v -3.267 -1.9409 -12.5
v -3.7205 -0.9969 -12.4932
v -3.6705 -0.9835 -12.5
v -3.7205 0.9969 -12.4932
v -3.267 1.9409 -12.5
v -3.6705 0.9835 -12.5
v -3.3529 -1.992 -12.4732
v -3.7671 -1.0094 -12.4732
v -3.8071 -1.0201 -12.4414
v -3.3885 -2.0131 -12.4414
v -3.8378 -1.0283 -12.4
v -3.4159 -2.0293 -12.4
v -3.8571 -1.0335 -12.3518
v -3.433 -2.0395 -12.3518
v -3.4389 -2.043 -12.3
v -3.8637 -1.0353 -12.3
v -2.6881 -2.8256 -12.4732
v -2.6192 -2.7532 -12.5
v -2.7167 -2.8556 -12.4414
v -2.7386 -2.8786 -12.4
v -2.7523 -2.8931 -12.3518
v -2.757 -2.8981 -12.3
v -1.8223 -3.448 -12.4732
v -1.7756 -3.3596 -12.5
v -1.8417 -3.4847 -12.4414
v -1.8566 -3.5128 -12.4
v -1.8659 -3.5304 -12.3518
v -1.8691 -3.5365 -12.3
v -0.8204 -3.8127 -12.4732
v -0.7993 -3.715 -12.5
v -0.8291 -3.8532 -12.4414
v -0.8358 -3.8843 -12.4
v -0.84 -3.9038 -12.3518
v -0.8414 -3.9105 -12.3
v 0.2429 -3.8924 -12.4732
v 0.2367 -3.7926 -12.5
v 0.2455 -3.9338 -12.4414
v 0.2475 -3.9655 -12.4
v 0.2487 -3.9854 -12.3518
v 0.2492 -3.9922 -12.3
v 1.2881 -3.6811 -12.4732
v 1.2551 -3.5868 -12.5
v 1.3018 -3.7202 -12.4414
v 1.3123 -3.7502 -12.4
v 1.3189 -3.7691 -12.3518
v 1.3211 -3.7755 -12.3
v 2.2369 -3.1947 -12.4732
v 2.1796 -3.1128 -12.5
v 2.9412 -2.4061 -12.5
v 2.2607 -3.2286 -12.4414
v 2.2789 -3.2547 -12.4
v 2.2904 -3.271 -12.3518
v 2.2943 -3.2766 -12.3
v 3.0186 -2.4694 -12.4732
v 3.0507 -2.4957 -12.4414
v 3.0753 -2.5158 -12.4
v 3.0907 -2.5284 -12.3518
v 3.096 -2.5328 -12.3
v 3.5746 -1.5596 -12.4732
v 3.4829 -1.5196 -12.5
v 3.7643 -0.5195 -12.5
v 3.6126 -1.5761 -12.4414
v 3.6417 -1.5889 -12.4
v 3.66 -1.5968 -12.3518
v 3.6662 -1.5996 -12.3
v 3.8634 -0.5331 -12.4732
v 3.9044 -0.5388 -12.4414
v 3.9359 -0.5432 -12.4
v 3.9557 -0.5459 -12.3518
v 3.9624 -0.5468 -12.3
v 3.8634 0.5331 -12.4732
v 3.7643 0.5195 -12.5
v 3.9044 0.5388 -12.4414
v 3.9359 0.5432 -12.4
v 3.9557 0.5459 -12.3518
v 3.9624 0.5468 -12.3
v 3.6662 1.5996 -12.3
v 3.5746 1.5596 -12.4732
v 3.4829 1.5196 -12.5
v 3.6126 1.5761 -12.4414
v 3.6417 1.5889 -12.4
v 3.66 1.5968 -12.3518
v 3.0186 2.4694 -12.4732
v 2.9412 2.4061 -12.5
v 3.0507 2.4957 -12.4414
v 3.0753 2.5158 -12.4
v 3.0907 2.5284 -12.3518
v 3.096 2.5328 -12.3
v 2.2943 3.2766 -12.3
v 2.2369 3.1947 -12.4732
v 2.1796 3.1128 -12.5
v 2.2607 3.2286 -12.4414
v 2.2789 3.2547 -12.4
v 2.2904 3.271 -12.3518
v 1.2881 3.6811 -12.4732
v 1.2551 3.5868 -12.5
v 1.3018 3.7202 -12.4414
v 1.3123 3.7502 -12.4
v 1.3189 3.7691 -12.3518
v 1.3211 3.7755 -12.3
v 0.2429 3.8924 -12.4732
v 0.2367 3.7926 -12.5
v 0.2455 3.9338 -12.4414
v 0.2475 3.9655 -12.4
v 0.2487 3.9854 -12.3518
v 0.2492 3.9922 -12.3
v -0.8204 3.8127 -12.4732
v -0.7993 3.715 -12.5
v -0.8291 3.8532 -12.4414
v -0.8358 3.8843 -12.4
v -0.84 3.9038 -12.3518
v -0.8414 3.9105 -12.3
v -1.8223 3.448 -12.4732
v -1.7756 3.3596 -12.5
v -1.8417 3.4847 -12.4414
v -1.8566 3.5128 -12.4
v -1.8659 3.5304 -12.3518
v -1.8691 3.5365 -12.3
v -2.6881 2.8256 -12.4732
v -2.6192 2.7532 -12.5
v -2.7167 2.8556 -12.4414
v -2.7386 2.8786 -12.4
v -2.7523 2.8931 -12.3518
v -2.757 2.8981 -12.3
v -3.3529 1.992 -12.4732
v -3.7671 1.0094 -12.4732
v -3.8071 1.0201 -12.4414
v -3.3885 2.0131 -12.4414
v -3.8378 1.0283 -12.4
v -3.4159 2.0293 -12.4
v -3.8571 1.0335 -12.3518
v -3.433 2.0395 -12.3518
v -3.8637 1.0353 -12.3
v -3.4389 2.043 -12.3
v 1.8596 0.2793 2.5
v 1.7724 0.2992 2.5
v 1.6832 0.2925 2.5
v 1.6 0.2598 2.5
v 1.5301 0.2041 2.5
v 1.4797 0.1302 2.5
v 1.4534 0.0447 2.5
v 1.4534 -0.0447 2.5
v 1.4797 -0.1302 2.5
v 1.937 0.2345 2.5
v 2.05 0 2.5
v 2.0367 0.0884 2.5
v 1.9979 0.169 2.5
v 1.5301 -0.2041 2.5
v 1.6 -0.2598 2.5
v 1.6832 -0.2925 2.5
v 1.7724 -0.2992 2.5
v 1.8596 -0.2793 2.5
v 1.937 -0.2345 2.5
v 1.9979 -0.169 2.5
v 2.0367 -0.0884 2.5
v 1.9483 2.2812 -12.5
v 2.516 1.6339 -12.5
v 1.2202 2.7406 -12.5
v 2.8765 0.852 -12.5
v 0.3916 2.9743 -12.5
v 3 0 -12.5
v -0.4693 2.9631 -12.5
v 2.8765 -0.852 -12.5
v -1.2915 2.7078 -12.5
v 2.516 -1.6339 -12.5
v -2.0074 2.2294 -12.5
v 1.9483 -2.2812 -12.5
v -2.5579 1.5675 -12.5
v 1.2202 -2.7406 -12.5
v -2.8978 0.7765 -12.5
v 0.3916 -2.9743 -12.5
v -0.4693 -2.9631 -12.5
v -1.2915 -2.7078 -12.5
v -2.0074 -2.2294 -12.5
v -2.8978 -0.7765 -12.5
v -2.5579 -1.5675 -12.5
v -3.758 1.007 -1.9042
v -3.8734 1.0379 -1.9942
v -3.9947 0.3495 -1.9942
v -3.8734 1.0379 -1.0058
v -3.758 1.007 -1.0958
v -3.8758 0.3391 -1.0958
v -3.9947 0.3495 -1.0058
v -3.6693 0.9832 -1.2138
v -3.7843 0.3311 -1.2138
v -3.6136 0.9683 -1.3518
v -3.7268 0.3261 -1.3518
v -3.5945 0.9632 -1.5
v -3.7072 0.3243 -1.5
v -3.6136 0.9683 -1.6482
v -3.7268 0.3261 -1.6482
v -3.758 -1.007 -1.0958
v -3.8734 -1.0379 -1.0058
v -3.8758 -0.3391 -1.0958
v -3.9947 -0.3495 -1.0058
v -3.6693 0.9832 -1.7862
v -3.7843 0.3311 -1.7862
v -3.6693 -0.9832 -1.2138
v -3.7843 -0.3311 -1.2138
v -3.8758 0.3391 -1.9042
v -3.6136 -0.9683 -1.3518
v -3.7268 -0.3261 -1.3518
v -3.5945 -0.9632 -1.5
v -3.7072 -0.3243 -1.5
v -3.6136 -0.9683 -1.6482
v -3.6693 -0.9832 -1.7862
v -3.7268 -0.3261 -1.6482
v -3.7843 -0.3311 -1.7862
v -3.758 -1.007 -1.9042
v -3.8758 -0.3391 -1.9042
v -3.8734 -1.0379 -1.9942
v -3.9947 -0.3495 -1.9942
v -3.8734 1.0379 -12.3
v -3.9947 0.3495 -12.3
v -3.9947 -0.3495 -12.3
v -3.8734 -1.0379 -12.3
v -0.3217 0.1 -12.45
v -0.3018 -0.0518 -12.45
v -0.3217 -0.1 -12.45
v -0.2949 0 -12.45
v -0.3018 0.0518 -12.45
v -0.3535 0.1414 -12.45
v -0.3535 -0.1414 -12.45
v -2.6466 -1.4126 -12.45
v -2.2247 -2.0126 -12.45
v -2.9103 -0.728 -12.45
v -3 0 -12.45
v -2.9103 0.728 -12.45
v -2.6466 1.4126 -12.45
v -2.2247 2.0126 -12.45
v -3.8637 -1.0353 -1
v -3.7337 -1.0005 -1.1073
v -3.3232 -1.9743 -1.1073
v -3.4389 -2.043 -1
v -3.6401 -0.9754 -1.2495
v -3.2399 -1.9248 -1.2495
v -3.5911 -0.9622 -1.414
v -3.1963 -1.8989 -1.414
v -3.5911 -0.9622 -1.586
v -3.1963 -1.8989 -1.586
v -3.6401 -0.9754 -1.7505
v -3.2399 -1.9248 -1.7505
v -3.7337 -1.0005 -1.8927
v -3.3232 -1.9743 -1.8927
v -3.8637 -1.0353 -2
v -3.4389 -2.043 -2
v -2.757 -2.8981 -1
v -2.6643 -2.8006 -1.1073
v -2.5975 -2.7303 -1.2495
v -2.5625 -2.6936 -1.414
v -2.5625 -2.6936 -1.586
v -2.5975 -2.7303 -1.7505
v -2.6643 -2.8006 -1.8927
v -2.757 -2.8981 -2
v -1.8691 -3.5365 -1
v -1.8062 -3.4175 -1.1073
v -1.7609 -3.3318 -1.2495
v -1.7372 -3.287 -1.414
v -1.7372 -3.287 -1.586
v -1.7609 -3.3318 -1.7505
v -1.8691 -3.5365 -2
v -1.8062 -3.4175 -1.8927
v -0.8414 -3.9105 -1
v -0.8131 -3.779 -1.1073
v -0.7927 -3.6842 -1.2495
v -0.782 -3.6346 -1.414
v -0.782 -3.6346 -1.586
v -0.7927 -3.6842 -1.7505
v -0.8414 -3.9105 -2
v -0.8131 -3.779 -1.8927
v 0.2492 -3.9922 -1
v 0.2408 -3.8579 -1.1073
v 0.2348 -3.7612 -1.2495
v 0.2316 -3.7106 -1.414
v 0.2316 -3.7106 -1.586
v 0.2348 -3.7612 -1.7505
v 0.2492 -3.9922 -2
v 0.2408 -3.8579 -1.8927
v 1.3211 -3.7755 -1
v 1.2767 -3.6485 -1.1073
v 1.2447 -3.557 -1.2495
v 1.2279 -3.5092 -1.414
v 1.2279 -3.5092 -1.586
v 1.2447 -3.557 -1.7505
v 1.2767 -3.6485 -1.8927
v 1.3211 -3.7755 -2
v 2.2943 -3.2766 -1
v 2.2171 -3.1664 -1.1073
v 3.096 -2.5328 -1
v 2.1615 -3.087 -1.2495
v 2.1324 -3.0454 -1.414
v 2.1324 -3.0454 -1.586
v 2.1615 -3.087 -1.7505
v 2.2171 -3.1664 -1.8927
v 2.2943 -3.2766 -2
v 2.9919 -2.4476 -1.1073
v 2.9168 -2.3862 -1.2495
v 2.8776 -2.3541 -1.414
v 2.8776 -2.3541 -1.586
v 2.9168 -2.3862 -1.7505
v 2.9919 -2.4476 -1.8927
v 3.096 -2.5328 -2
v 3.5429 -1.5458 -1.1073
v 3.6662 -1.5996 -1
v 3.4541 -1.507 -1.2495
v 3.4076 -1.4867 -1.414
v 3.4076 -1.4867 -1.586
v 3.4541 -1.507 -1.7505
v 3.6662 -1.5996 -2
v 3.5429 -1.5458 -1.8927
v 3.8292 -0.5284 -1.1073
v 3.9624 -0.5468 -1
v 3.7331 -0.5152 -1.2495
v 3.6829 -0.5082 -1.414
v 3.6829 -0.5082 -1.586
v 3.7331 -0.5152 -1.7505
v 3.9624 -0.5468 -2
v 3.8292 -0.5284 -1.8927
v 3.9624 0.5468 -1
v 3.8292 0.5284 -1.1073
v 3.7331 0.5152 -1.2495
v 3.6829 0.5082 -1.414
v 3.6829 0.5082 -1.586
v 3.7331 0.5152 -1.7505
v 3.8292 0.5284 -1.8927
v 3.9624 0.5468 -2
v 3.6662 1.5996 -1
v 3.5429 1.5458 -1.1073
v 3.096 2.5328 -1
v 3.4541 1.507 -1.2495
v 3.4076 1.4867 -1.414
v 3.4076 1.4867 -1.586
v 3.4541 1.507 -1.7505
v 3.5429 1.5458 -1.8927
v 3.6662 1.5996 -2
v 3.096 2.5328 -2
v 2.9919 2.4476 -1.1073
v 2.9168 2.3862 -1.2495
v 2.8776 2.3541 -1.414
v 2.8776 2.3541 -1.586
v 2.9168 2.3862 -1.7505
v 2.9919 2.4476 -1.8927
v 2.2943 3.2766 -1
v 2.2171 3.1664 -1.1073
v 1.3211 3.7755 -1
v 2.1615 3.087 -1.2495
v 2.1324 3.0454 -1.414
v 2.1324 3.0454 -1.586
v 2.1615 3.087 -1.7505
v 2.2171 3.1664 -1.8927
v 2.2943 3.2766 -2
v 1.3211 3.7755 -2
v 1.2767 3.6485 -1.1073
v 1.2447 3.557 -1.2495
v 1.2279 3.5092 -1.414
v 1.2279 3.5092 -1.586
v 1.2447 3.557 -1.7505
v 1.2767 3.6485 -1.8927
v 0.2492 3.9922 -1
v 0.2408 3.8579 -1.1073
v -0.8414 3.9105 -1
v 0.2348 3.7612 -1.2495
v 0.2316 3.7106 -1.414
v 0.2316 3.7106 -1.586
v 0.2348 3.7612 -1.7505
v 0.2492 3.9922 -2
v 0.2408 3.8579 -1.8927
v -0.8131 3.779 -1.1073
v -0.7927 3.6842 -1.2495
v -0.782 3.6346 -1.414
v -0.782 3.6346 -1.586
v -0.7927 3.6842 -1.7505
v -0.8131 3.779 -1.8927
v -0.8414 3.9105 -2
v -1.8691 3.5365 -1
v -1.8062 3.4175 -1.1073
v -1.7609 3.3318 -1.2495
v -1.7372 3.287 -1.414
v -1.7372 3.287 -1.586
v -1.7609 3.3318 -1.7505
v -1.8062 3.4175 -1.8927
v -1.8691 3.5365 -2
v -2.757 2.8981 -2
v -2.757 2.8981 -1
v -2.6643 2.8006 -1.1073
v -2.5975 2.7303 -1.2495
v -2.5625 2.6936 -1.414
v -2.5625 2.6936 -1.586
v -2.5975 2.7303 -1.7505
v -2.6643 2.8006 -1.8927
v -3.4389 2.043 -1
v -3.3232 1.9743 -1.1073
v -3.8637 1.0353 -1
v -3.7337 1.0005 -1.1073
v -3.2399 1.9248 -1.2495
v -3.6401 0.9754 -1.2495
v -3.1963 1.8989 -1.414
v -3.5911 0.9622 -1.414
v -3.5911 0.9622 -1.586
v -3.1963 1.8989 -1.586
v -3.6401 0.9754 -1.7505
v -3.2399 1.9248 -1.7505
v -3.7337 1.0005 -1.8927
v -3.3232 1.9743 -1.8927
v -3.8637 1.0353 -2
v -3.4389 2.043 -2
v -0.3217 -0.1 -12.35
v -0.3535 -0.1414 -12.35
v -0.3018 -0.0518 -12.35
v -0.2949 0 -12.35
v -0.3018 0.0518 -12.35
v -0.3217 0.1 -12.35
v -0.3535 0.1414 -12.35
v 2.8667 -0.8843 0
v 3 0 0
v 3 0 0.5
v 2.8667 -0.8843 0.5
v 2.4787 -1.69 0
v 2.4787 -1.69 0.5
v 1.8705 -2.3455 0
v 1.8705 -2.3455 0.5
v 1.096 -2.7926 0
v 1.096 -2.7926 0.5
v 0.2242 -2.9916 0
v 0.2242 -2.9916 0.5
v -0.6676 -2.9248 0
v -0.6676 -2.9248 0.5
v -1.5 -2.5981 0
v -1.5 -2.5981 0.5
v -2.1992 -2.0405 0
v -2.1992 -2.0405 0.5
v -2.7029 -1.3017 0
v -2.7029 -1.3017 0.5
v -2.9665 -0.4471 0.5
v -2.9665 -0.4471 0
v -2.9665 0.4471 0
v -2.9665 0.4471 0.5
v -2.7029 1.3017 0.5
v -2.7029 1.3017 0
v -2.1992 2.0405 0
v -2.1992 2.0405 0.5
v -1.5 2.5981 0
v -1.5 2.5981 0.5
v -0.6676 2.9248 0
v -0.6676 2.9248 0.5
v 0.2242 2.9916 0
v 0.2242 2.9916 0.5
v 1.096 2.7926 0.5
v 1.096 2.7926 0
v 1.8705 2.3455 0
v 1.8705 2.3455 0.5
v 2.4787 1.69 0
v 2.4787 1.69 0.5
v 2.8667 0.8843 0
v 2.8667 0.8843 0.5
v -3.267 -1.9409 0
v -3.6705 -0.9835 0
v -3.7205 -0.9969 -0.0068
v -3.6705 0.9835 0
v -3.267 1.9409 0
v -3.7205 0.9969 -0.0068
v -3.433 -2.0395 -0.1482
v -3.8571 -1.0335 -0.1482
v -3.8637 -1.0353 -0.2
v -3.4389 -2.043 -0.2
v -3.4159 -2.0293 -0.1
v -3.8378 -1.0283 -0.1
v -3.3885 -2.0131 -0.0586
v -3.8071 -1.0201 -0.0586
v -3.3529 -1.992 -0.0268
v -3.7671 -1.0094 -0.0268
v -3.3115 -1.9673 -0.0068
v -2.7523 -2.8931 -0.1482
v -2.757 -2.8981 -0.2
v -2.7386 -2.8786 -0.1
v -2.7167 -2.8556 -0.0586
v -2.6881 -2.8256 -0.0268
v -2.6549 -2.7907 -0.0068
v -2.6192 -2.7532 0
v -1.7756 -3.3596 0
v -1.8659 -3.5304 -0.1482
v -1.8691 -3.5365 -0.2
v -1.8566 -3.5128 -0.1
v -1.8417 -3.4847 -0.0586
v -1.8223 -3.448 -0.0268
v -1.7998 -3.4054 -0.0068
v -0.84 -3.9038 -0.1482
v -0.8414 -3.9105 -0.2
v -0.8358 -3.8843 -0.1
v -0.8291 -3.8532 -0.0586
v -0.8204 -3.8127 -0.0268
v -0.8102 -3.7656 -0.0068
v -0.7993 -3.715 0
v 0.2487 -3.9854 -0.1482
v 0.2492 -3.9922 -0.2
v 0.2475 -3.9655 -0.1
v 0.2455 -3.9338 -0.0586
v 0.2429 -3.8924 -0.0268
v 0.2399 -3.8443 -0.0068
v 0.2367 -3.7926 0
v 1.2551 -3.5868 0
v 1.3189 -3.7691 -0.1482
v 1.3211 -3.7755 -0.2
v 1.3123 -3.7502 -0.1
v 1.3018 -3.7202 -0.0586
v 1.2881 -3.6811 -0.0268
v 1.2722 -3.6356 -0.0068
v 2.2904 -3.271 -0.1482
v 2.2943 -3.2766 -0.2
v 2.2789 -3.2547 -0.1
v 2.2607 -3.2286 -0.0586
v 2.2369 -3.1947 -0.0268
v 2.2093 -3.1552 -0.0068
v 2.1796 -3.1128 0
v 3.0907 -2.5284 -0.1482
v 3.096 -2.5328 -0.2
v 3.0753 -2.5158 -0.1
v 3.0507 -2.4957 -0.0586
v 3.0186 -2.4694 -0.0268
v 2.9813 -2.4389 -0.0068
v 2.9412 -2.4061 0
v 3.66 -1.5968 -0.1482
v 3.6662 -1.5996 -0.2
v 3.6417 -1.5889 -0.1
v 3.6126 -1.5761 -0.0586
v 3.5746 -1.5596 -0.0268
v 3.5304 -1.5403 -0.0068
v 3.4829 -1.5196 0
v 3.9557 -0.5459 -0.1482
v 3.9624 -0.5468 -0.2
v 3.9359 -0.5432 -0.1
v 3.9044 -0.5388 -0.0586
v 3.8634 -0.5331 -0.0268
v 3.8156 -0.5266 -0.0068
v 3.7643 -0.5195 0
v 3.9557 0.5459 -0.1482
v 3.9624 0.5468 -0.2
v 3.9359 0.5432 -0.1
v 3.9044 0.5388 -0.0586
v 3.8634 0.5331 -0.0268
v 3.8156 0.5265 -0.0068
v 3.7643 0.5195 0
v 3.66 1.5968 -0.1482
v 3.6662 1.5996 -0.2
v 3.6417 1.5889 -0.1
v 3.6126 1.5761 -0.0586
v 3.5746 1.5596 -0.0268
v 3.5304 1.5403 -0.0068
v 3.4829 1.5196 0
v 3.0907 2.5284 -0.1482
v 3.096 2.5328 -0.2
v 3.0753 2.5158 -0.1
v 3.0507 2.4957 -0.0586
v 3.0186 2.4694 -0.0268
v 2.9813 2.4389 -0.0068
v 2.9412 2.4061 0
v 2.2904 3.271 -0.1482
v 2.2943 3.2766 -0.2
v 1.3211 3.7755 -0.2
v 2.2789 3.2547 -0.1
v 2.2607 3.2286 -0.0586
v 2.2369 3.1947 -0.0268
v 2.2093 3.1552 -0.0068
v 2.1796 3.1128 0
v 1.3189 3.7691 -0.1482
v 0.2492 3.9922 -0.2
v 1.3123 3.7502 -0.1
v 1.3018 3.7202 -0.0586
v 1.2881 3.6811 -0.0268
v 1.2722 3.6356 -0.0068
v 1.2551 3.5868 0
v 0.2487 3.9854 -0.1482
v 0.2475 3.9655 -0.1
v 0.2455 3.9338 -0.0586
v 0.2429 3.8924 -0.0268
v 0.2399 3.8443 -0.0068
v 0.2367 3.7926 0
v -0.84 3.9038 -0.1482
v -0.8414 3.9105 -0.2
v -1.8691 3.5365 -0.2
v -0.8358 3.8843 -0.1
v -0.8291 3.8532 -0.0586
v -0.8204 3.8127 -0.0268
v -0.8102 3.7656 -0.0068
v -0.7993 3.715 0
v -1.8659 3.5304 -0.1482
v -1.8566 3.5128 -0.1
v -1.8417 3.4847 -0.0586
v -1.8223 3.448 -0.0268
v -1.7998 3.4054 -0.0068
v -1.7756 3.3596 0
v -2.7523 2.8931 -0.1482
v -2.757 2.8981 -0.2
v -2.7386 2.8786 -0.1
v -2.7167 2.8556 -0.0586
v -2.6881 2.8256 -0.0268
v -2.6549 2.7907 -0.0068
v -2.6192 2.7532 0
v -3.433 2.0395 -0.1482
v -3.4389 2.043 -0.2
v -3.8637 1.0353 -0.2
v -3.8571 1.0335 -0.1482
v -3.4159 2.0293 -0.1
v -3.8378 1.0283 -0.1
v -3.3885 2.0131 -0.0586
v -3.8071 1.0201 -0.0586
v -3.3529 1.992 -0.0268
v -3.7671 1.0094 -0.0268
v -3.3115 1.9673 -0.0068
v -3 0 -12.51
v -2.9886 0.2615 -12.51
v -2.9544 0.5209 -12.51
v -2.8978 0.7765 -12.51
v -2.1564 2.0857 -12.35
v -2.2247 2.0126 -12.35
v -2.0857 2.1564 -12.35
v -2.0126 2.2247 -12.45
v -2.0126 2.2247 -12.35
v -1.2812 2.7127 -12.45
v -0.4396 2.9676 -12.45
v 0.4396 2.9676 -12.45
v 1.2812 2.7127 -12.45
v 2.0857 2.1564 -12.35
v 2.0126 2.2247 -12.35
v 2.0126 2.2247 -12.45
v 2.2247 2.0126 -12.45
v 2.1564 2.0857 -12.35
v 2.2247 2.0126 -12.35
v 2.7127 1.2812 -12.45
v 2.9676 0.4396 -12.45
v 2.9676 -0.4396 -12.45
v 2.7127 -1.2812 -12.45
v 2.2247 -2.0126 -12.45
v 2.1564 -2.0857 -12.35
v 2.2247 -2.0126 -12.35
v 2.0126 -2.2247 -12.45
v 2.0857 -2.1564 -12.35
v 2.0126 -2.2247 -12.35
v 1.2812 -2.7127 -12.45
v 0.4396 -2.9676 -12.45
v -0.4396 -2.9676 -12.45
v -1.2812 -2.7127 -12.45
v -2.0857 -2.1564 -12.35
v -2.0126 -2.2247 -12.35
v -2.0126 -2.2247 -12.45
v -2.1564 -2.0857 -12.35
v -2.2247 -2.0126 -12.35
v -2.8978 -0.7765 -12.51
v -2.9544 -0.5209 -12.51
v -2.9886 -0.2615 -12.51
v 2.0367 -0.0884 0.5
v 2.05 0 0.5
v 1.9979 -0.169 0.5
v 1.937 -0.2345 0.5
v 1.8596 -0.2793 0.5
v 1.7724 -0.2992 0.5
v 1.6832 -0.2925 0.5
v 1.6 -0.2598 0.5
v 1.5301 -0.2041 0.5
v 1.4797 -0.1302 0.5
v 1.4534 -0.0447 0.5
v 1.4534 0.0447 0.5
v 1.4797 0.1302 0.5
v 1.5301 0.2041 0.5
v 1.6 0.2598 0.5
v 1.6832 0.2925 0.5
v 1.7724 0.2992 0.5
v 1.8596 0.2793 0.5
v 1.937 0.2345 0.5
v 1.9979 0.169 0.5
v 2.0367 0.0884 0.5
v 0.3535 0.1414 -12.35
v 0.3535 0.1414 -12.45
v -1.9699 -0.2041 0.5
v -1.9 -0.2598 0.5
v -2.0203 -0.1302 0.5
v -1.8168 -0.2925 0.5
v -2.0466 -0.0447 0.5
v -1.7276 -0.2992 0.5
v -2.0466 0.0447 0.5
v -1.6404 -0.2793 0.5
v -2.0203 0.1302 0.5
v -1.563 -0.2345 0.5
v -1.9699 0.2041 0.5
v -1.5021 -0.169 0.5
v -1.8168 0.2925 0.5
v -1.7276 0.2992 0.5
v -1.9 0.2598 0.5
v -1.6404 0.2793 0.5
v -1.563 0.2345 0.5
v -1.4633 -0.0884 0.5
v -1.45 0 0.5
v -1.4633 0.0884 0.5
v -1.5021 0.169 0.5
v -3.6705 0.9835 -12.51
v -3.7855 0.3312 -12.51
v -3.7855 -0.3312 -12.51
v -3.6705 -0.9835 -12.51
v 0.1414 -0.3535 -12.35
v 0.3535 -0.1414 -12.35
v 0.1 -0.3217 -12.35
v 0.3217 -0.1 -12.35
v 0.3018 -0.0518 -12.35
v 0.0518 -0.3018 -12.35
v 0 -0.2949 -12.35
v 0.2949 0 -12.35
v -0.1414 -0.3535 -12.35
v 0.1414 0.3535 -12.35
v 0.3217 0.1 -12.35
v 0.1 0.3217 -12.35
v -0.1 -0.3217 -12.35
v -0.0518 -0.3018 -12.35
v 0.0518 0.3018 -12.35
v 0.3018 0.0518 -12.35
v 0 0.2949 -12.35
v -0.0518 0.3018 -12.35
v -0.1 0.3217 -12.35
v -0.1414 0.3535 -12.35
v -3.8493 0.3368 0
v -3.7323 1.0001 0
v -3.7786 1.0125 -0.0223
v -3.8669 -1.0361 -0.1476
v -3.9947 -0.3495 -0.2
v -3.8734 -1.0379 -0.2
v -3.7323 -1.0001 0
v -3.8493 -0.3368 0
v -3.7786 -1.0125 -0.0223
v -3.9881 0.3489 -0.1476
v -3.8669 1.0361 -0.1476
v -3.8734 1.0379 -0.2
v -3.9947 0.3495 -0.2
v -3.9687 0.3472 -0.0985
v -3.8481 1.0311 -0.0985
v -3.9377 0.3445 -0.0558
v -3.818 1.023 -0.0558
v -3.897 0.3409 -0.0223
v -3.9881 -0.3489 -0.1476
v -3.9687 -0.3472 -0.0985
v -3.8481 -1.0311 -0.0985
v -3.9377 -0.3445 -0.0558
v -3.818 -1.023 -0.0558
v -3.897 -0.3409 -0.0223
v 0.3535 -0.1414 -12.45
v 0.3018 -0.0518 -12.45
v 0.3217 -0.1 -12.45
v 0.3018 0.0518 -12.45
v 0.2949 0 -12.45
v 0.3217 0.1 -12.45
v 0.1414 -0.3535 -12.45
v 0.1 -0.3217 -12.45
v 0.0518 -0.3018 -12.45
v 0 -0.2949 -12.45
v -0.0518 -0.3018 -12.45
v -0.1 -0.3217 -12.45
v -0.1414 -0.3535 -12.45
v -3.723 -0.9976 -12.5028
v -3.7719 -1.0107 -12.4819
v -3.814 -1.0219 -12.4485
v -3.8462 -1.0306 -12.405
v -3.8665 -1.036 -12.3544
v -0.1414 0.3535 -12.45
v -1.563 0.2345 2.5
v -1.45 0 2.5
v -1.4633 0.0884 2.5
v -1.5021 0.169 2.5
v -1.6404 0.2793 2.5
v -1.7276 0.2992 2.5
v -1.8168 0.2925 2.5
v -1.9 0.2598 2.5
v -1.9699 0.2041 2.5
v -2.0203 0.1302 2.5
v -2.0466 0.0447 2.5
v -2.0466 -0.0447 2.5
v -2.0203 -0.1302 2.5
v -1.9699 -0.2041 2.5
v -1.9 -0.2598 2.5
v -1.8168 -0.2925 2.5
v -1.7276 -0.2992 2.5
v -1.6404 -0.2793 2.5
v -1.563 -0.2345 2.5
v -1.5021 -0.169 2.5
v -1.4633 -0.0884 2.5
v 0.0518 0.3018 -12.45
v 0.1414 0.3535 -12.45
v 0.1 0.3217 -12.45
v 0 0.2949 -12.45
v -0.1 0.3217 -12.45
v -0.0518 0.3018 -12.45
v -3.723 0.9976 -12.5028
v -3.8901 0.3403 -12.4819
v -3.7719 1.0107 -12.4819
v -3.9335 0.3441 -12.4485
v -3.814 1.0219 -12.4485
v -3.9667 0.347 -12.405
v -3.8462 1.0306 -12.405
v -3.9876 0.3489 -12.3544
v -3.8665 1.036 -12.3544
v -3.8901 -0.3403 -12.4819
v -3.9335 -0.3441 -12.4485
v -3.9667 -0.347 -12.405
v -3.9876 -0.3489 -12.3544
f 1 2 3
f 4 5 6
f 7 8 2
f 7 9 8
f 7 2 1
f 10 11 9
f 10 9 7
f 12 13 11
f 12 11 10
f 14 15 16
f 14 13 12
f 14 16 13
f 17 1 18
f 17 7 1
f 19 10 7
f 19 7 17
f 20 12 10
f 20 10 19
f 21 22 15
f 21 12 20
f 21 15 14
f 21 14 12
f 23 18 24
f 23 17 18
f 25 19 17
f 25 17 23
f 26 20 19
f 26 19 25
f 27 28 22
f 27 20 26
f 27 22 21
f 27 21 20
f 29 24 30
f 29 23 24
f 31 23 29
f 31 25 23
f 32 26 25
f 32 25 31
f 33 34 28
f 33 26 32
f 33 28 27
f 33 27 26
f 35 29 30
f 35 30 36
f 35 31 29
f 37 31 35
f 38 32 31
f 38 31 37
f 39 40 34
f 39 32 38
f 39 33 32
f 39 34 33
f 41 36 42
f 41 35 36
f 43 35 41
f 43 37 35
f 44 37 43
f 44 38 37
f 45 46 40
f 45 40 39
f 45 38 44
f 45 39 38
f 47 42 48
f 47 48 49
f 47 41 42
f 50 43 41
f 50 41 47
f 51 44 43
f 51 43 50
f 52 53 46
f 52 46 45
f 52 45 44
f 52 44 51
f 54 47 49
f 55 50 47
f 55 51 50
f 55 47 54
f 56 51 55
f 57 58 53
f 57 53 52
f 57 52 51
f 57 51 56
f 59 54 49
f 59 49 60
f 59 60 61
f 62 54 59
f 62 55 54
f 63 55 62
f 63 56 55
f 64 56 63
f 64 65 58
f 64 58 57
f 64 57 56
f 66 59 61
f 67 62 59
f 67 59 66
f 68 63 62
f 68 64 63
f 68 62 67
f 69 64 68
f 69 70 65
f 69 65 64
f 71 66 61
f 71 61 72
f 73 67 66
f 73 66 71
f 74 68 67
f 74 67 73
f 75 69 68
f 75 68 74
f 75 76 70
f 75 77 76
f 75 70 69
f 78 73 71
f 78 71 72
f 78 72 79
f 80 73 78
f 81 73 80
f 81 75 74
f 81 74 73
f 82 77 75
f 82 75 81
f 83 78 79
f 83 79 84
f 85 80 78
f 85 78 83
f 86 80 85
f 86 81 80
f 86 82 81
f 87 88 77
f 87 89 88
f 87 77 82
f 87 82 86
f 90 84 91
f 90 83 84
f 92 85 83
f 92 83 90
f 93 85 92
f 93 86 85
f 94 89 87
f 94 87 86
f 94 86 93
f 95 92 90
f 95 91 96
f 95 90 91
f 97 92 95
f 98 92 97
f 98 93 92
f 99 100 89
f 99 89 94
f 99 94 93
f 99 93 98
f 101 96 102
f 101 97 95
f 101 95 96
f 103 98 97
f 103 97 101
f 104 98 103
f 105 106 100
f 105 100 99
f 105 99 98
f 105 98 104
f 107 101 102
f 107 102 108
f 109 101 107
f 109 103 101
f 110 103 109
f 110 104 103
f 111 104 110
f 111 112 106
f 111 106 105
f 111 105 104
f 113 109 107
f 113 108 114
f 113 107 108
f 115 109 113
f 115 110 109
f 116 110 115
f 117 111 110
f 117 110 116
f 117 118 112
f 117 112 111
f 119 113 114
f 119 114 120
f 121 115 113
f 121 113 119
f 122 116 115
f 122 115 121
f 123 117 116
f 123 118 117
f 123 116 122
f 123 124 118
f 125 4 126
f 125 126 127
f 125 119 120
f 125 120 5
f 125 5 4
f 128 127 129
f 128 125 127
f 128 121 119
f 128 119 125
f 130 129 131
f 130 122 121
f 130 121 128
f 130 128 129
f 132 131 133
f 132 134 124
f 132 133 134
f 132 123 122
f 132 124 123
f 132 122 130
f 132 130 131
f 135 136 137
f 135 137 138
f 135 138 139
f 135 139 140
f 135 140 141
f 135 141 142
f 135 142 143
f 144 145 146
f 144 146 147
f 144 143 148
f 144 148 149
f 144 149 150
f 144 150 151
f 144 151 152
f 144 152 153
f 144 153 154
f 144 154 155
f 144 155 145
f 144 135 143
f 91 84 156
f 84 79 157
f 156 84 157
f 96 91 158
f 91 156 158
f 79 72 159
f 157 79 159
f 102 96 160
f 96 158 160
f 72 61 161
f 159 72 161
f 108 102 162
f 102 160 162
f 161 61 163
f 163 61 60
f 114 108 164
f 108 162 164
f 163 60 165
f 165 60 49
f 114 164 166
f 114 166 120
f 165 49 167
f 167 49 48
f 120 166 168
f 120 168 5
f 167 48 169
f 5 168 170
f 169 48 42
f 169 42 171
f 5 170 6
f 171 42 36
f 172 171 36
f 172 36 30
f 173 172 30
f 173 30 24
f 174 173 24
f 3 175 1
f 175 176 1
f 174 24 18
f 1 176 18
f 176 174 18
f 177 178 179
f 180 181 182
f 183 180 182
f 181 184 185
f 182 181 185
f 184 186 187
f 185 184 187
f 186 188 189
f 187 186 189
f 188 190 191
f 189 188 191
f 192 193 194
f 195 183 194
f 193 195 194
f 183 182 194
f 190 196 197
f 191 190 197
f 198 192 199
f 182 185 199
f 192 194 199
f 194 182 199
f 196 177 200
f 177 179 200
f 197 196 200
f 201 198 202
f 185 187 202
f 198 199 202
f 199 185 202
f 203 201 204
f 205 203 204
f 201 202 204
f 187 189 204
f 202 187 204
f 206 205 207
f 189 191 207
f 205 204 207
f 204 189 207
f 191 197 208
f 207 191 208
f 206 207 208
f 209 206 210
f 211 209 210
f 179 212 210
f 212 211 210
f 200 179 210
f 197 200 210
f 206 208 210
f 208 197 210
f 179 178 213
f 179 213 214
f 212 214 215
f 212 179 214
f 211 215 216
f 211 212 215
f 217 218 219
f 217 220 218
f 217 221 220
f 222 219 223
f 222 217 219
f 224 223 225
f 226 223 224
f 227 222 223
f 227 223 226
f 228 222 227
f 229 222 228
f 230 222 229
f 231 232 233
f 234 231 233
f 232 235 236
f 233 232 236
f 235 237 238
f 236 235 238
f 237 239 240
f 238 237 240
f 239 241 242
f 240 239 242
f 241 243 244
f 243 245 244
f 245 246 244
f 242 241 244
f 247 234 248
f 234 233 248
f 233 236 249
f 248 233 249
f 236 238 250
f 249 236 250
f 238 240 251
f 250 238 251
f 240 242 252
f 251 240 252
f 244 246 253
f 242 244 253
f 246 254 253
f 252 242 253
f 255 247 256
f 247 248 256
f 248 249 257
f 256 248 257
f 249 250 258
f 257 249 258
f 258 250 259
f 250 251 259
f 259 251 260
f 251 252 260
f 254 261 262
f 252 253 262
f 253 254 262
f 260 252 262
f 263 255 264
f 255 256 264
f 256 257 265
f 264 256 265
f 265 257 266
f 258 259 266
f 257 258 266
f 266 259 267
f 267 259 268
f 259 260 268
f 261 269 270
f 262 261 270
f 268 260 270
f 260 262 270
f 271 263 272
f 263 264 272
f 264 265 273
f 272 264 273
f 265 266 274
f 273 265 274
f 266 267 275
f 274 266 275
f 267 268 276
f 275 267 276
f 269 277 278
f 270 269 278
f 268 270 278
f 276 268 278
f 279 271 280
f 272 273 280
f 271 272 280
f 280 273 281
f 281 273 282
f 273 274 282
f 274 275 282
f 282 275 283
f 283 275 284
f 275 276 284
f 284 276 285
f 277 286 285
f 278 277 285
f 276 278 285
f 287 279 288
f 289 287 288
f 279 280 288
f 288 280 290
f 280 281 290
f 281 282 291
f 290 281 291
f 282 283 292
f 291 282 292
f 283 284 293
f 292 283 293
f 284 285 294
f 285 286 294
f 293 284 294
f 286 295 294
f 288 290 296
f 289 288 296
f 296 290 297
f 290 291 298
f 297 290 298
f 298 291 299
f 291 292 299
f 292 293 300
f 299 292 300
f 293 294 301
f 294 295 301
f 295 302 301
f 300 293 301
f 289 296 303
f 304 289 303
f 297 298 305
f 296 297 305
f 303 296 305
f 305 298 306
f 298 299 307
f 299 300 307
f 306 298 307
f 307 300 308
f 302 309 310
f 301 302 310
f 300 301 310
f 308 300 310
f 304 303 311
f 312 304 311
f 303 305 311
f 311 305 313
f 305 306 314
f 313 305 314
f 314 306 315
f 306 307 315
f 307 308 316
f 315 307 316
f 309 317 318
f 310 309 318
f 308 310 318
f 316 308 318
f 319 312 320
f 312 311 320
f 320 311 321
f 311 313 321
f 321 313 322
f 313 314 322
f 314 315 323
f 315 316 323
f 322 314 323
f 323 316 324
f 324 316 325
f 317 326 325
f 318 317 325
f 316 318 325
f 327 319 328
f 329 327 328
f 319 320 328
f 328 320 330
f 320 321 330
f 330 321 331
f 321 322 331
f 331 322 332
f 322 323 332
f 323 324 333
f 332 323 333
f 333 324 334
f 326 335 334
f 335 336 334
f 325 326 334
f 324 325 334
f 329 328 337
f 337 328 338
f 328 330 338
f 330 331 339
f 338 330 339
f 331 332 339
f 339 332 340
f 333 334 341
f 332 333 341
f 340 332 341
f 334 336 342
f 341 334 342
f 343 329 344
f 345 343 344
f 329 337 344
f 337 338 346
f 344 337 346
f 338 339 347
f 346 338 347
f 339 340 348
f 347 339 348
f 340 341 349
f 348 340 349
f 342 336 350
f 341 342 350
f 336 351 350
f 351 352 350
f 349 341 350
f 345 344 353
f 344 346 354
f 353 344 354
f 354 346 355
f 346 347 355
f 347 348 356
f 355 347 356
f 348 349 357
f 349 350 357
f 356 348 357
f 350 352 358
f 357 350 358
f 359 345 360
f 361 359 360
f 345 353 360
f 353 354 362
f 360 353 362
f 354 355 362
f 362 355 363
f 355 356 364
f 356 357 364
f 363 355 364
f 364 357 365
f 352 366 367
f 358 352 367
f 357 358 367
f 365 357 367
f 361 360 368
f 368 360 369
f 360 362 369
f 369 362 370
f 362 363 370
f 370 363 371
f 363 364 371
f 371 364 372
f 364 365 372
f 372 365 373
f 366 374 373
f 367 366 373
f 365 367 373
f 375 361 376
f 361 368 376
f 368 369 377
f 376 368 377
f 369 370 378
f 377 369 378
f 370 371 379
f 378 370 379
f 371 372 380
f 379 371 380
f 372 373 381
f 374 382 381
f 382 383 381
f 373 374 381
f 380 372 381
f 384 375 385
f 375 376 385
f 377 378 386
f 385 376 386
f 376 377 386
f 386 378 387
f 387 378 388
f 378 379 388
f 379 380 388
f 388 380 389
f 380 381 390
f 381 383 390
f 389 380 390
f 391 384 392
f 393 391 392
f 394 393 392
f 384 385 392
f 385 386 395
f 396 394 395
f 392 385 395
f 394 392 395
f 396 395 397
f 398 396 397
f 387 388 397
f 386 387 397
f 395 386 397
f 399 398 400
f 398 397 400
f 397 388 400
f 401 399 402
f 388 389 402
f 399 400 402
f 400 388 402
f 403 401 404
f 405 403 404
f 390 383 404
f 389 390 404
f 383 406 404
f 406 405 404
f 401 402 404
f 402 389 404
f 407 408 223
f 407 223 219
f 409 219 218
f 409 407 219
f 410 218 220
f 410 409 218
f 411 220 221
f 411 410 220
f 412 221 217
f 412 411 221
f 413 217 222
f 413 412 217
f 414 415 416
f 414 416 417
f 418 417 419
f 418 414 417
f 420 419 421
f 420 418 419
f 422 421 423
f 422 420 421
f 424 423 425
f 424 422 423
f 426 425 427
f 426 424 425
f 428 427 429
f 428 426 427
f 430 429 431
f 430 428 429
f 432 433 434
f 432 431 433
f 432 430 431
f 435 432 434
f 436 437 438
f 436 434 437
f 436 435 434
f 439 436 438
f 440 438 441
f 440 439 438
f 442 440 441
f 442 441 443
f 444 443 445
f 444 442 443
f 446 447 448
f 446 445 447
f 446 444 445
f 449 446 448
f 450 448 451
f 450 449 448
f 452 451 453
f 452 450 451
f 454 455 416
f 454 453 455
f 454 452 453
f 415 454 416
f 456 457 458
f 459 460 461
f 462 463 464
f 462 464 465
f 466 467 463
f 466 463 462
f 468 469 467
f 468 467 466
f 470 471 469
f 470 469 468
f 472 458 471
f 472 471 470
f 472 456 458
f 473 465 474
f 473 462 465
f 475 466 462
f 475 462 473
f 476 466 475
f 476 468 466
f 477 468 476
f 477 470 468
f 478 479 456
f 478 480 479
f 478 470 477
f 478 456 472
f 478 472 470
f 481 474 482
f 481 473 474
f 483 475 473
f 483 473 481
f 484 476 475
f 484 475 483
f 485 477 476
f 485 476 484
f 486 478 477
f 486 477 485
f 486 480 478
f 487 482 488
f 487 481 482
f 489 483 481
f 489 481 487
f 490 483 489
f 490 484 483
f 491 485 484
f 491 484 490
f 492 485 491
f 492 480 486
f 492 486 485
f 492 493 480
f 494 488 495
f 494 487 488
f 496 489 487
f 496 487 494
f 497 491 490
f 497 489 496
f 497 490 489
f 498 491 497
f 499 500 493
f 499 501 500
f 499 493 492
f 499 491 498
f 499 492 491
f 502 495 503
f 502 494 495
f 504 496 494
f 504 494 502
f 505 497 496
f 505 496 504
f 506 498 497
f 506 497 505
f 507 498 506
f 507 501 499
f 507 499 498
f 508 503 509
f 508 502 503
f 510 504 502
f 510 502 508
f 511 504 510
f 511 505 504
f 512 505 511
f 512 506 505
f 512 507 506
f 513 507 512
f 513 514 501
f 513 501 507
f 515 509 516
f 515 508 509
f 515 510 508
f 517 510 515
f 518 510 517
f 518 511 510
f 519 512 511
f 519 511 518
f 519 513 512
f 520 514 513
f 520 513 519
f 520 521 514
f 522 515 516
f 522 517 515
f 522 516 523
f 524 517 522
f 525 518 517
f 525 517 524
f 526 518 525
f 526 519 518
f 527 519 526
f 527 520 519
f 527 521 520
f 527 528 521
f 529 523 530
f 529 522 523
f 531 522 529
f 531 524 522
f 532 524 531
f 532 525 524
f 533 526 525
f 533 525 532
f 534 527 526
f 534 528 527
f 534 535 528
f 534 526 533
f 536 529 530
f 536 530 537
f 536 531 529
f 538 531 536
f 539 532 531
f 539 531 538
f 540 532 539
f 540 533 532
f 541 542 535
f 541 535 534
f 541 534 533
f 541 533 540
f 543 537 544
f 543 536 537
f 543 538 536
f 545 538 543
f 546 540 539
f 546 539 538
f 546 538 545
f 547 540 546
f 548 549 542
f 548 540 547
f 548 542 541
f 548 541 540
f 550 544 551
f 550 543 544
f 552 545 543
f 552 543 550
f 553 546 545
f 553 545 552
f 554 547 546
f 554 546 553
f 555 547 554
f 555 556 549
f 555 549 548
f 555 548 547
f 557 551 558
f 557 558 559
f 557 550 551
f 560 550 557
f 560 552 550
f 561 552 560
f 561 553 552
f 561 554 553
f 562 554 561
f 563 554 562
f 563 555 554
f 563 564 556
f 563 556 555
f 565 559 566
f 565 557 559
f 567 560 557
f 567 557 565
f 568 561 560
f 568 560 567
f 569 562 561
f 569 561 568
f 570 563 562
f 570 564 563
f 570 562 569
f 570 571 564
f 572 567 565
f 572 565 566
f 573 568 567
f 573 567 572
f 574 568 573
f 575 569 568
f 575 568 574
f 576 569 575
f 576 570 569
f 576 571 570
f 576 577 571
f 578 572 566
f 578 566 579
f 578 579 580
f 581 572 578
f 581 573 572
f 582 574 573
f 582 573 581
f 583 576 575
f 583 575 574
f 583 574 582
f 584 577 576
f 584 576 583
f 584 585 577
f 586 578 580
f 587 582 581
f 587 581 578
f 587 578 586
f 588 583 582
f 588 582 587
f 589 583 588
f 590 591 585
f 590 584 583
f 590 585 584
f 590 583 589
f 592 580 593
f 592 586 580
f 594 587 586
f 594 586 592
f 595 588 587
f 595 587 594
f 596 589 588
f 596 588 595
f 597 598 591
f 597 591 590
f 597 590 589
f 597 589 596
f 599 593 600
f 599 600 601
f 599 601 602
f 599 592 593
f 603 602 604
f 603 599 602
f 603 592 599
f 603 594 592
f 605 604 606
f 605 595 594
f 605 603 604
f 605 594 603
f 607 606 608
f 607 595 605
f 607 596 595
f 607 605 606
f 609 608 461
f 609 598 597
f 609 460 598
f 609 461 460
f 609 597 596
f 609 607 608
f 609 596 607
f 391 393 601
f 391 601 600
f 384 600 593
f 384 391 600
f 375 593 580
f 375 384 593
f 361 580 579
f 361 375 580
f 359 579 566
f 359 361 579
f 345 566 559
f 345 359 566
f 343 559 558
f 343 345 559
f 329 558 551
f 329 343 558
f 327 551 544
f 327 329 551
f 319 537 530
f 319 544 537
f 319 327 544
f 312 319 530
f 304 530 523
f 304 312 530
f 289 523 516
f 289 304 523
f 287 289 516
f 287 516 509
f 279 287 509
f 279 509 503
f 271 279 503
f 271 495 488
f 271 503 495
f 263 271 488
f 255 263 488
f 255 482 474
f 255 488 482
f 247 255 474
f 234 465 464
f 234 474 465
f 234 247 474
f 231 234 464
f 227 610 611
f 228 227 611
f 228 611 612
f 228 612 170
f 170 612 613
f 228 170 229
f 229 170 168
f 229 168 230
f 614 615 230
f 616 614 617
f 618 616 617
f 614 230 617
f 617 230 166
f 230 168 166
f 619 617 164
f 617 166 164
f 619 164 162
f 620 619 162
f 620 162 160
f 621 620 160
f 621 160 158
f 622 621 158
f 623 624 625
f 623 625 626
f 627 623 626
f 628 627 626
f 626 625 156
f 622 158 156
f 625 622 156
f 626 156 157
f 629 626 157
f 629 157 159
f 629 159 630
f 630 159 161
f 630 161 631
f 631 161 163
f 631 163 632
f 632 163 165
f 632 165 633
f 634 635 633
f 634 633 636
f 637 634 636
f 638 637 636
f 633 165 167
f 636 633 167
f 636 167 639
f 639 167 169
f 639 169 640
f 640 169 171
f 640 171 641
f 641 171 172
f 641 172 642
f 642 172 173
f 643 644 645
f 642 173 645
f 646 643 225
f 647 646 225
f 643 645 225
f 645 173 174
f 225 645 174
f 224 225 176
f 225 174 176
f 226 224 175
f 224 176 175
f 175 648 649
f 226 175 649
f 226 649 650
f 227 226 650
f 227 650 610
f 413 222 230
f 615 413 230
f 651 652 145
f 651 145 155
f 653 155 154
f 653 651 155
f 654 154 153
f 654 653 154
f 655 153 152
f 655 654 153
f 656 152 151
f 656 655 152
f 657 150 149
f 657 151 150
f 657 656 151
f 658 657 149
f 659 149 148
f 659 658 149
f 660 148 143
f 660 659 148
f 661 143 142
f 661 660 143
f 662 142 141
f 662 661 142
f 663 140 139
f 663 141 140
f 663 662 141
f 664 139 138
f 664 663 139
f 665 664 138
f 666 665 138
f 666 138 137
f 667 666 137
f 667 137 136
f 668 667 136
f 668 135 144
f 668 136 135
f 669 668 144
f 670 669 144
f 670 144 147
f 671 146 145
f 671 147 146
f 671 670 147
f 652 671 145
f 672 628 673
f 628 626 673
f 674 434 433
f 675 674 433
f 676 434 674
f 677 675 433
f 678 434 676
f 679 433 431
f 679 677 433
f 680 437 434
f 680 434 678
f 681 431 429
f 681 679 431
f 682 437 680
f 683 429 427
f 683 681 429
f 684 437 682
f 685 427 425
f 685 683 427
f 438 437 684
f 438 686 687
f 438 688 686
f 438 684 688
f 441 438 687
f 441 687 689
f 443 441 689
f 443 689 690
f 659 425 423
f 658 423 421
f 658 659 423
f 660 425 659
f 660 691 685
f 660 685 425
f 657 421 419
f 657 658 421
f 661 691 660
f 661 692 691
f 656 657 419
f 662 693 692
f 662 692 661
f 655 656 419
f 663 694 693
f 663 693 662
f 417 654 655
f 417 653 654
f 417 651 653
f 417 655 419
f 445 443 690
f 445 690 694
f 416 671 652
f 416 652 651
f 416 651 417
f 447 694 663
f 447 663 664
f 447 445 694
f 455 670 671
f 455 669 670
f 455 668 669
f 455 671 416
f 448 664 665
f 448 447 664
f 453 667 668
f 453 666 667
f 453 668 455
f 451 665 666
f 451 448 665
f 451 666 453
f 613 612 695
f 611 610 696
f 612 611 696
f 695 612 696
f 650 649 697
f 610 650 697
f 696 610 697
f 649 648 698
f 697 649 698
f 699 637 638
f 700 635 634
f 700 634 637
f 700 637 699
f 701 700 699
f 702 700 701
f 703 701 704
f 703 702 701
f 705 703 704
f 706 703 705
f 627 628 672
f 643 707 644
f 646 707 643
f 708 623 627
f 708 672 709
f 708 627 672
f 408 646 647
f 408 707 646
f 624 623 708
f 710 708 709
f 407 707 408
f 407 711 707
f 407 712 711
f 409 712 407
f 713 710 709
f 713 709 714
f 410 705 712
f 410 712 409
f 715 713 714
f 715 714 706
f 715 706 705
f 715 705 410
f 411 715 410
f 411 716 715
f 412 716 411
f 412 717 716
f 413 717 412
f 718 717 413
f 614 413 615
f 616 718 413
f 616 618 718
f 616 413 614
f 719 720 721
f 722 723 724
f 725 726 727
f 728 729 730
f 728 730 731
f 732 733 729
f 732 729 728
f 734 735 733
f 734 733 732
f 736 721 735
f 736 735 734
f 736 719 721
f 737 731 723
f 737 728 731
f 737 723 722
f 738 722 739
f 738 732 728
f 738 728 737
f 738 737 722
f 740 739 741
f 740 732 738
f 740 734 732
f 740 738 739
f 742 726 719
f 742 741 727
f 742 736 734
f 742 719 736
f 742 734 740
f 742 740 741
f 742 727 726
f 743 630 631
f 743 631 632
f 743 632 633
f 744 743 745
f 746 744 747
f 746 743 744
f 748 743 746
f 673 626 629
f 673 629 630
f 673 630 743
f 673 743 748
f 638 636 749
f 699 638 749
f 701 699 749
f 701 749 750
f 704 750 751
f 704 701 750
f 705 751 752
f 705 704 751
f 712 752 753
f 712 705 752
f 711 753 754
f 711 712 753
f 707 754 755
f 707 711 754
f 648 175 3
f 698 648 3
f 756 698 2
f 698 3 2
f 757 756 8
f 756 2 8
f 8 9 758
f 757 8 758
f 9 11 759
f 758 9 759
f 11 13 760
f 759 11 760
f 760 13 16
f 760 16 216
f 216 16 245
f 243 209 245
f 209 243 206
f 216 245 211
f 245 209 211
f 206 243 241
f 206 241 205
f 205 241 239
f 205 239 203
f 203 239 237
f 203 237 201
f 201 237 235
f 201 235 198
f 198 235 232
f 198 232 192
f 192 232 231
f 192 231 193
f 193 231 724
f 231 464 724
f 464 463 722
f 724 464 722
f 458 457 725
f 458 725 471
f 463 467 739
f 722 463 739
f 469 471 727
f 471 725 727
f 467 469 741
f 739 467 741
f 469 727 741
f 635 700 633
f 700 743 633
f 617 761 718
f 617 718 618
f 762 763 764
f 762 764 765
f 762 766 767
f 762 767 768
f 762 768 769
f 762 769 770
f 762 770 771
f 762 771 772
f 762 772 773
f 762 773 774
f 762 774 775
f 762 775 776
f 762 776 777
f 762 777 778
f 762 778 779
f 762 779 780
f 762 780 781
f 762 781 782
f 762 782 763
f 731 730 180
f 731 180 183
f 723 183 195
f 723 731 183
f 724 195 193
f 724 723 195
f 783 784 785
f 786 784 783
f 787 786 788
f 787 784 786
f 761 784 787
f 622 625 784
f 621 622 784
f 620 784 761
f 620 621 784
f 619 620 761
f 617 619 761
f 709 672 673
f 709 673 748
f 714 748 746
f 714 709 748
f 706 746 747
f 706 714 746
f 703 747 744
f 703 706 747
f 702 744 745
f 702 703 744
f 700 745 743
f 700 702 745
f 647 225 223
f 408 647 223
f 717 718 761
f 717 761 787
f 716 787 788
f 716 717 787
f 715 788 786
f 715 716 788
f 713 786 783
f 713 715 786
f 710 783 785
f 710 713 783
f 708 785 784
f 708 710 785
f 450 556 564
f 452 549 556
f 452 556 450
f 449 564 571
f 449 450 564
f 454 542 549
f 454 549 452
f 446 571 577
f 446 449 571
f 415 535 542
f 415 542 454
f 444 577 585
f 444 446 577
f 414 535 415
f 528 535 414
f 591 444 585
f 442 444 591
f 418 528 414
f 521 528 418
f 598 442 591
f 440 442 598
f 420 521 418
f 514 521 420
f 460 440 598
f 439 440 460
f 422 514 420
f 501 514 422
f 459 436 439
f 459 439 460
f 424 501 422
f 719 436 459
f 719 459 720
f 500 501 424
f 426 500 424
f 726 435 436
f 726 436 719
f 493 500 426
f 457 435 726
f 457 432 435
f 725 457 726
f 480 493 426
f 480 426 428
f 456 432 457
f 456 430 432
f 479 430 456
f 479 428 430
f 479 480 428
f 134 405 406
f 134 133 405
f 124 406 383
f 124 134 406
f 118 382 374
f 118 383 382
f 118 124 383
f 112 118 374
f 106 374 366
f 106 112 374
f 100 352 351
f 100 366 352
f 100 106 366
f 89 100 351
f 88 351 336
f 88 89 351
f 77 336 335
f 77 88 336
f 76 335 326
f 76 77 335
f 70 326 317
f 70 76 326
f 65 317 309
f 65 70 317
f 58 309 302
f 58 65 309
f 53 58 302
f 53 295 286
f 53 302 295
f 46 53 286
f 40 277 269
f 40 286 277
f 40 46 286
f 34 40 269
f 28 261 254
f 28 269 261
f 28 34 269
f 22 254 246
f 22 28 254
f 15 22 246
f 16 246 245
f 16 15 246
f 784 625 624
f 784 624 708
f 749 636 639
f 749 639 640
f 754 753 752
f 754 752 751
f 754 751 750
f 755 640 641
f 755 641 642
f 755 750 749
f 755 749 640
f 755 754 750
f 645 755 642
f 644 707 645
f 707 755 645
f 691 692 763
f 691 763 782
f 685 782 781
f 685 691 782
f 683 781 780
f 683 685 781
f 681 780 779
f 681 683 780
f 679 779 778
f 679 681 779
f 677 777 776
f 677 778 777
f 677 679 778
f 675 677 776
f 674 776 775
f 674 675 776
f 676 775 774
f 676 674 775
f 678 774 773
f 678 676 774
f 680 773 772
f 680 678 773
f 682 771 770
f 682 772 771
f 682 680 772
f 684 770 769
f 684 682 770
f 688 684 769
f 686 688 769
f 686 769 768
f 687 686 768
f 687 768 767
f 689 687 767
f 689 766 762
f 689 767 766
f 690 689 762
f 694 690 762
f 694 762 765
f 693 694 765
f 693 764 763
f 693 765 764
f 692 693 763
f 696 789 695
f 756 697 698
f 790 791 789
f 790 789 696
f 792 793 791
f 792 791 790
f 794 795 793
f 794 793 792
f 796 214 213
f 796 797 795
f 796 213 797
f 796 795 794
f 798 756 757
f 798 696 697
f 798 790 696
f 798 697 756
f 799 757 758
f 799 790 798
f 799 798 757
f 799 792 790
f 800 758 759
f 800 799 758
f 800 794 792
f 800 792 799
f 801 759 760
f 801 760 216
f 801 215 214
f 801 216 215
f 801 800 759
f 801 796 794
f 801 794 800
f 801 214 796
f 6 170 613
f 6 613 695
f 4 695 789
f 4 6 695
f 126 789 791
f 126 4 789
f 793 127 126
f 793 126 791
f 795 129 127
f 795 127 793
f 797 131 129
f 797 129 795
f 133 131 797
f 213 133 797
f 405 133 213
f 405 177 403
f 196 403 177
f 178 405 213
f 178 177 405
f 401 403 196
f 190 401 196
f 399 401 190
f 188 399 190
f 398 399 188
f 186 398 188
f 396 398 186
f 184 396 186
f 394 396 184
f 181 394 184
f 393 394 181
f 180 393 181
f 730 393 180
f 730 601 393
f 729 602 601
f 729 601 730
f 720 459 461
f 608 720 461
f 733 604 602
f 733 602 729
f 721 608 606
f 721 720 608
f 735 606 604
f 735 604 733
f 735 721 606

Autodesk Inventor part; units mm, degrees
ref_plane "YZ Plane" through (0, 0, 0) normal (1, 0, 0) x (0, 1, 0)
ref_plane "XZ Plane" through (0, 0, 0) normal (0, 1, 0) x (-1, 0, 0)
ref_plane "XY Plane" through (0, 0, 0) normal (0, 0, 1) x (1, 0, 0)
sketch "Sketch1" plane through (0, 0, 0) normal (0, 1, 0) x (-1, 0, 0)
  line L0 (0, 0) -> (3.8, 0)
  line L1 (4, -0.2) -> (4, -1)
  arc A0 (4, -1) -> (4, -2) centre (4.2887, -1.5) ccw
  line L2 (4, -2) -> (4, -12.3)
  line L3 (3.8, -12.5) -> (0, -12.5)
  line L4 (0, -12.5) -> (0, 0)
  line L5 (4, -1) -> (3.134, -1.5) construction
  arc A1 (3.8, -12.5) -> (4, -12.3) centre (3.8, -12.3) ccw
  arc A2 (4, -0.2) -> (3.8, 0) centre (3.8, -0.2) ccw
  line L6 (0, -12.5) -> (0, -12.51)
  line L7 (0, -12.51) -> (3.8, -12.51)
  arc A3 (3.8, -12.51) -> (4.01, -12.3) centre (3.8, -12.3) ccw
  line L8 (4.01, -12.3) -> (4.01, -1.9942)
  arc A4 (4.01, -1.0058) -> (4.01, -1.9942) centre (4.2887, -1.5) ccw
  line L9 (4.01, -1.0058) -> (4.01, -0.2)
  arc A5 (4.01, -0.2) -> (3.864, 0) centre (3.8, -0.2) ccw
  line L10 (3.864, 0) -> (3.8, 0)
  line L11 (3.7113, -1.5) -> (3.7213, -1.5) construction
  point P0 (4, 0)
  point P1 (4, -12.5)
  dimension "d0" = 4
  dimension "d1" = 12.5
  dimension "d3" = 1
  dimension "d4" = 60
  dimension "d5" = 1
  dimension "d7" = 0.2
  dimension "d8" = 0.2
  dimension "d20" = 0.01
revolve "Revolution1" add sketch "Sketch1" angle 360 about axis through (0, 0, -12.5) along (0, 0, 1) contours L0 A2 L1 A0 L2 A1 L3 L4
revolve "Revolution2" add sketch "Sketch1" angle 30 mid plane about axis through (0, 0, -12.5) along (0, 0, 1) contours L10 A5 L9 A4 L8 A3 L7 L6 L3 A1 L2 A0 L1 A2
sketch "Sketch2" plane through (0, 0, -12.5) normal (0, 0, -1) x (-1, 0, 0)
  circle A0 centre (0, 0) radius 3
  dimension "d9" = 6
extrude "Extrusion1" cut sketch "Sketch2" against normal mid plane 0.1
sketch "Sketch6" plane through (0, 0, 0) normal (0, 0, 1) x (1, 0, 0)
  circle A0 centre (0, 0) radius 3
  dimension "d27" = 6
extrude "Extrusion4" add sketch "Sketch6" along normal blind 0.5
sketch "Sketch3" plane through (0, 0, 0.5) normal (0, 0, 1) x (1, 0, 0)
  circle A0 centre (-1.75, 0) radius 0.3
  circle A1 centre (1.75, 0) radius 0.3
  line L0 (0, -5.6) -> (0, 5.6) construction
  point P0 (0, 0)
  dimension "d12" = 3.5
  dimension "d13" = 0.6
extrude "Extrusion2" add sketch "Sketch3" along normal blind 2
sketch "Sketch5" plane through (0, 0, -12.45) normal (0, 0, -1) x (-1, 0, 0)
  line L0 (-2.0126, 2.2247) -> (0, 0.2121)
  line L1 (0, 0.2121) -> (2.0126, 2.2247)
  circle A0 centre (0, 0) radius 3 projected
  line L2 (-2.2247, 2.0126) -> (-0.2121, 0)
  line L3 (-0.2121, 0) -> (-2.2247, -2.0126)
  line L4 (-2.0126, -2.2247) -> (0, -0.2121)
  line L5 (0, -0.2121) -> (2.0126, -2.2247)
  line L6 (2.2247, -2.0126) -> (0.2121, 0)
  line L7 (0.2121, 0) -> (2.2247, 2.0126)
  line L8 (0, 0.2121) -> (0.2121, 0) construction
  line L9 (0, -0.2121) -> (-0.2121, 0) construction
  line L10 (-0.2121, 0) -> (0, 0.2121) construction
  line L11 (0, -0.2121) -> (0.2121, 0) construction
  dimension "d23" = 0.3
extrude "Extrusion3" cut sketch "Sketch5" against normal blind 0.1 contours L0 L1 A0 L7 L6 L5 L4 L3 L2
fillet "Fillet1" radius 0.2 4 edges at (0, 0.2121, -12.4) (-0.2121, 0, -12.4) (0, -0.2121, -12.4) (0.2121, 0, -12.4)
properties part number "CPOL-D8-H11_5-P3_5"
